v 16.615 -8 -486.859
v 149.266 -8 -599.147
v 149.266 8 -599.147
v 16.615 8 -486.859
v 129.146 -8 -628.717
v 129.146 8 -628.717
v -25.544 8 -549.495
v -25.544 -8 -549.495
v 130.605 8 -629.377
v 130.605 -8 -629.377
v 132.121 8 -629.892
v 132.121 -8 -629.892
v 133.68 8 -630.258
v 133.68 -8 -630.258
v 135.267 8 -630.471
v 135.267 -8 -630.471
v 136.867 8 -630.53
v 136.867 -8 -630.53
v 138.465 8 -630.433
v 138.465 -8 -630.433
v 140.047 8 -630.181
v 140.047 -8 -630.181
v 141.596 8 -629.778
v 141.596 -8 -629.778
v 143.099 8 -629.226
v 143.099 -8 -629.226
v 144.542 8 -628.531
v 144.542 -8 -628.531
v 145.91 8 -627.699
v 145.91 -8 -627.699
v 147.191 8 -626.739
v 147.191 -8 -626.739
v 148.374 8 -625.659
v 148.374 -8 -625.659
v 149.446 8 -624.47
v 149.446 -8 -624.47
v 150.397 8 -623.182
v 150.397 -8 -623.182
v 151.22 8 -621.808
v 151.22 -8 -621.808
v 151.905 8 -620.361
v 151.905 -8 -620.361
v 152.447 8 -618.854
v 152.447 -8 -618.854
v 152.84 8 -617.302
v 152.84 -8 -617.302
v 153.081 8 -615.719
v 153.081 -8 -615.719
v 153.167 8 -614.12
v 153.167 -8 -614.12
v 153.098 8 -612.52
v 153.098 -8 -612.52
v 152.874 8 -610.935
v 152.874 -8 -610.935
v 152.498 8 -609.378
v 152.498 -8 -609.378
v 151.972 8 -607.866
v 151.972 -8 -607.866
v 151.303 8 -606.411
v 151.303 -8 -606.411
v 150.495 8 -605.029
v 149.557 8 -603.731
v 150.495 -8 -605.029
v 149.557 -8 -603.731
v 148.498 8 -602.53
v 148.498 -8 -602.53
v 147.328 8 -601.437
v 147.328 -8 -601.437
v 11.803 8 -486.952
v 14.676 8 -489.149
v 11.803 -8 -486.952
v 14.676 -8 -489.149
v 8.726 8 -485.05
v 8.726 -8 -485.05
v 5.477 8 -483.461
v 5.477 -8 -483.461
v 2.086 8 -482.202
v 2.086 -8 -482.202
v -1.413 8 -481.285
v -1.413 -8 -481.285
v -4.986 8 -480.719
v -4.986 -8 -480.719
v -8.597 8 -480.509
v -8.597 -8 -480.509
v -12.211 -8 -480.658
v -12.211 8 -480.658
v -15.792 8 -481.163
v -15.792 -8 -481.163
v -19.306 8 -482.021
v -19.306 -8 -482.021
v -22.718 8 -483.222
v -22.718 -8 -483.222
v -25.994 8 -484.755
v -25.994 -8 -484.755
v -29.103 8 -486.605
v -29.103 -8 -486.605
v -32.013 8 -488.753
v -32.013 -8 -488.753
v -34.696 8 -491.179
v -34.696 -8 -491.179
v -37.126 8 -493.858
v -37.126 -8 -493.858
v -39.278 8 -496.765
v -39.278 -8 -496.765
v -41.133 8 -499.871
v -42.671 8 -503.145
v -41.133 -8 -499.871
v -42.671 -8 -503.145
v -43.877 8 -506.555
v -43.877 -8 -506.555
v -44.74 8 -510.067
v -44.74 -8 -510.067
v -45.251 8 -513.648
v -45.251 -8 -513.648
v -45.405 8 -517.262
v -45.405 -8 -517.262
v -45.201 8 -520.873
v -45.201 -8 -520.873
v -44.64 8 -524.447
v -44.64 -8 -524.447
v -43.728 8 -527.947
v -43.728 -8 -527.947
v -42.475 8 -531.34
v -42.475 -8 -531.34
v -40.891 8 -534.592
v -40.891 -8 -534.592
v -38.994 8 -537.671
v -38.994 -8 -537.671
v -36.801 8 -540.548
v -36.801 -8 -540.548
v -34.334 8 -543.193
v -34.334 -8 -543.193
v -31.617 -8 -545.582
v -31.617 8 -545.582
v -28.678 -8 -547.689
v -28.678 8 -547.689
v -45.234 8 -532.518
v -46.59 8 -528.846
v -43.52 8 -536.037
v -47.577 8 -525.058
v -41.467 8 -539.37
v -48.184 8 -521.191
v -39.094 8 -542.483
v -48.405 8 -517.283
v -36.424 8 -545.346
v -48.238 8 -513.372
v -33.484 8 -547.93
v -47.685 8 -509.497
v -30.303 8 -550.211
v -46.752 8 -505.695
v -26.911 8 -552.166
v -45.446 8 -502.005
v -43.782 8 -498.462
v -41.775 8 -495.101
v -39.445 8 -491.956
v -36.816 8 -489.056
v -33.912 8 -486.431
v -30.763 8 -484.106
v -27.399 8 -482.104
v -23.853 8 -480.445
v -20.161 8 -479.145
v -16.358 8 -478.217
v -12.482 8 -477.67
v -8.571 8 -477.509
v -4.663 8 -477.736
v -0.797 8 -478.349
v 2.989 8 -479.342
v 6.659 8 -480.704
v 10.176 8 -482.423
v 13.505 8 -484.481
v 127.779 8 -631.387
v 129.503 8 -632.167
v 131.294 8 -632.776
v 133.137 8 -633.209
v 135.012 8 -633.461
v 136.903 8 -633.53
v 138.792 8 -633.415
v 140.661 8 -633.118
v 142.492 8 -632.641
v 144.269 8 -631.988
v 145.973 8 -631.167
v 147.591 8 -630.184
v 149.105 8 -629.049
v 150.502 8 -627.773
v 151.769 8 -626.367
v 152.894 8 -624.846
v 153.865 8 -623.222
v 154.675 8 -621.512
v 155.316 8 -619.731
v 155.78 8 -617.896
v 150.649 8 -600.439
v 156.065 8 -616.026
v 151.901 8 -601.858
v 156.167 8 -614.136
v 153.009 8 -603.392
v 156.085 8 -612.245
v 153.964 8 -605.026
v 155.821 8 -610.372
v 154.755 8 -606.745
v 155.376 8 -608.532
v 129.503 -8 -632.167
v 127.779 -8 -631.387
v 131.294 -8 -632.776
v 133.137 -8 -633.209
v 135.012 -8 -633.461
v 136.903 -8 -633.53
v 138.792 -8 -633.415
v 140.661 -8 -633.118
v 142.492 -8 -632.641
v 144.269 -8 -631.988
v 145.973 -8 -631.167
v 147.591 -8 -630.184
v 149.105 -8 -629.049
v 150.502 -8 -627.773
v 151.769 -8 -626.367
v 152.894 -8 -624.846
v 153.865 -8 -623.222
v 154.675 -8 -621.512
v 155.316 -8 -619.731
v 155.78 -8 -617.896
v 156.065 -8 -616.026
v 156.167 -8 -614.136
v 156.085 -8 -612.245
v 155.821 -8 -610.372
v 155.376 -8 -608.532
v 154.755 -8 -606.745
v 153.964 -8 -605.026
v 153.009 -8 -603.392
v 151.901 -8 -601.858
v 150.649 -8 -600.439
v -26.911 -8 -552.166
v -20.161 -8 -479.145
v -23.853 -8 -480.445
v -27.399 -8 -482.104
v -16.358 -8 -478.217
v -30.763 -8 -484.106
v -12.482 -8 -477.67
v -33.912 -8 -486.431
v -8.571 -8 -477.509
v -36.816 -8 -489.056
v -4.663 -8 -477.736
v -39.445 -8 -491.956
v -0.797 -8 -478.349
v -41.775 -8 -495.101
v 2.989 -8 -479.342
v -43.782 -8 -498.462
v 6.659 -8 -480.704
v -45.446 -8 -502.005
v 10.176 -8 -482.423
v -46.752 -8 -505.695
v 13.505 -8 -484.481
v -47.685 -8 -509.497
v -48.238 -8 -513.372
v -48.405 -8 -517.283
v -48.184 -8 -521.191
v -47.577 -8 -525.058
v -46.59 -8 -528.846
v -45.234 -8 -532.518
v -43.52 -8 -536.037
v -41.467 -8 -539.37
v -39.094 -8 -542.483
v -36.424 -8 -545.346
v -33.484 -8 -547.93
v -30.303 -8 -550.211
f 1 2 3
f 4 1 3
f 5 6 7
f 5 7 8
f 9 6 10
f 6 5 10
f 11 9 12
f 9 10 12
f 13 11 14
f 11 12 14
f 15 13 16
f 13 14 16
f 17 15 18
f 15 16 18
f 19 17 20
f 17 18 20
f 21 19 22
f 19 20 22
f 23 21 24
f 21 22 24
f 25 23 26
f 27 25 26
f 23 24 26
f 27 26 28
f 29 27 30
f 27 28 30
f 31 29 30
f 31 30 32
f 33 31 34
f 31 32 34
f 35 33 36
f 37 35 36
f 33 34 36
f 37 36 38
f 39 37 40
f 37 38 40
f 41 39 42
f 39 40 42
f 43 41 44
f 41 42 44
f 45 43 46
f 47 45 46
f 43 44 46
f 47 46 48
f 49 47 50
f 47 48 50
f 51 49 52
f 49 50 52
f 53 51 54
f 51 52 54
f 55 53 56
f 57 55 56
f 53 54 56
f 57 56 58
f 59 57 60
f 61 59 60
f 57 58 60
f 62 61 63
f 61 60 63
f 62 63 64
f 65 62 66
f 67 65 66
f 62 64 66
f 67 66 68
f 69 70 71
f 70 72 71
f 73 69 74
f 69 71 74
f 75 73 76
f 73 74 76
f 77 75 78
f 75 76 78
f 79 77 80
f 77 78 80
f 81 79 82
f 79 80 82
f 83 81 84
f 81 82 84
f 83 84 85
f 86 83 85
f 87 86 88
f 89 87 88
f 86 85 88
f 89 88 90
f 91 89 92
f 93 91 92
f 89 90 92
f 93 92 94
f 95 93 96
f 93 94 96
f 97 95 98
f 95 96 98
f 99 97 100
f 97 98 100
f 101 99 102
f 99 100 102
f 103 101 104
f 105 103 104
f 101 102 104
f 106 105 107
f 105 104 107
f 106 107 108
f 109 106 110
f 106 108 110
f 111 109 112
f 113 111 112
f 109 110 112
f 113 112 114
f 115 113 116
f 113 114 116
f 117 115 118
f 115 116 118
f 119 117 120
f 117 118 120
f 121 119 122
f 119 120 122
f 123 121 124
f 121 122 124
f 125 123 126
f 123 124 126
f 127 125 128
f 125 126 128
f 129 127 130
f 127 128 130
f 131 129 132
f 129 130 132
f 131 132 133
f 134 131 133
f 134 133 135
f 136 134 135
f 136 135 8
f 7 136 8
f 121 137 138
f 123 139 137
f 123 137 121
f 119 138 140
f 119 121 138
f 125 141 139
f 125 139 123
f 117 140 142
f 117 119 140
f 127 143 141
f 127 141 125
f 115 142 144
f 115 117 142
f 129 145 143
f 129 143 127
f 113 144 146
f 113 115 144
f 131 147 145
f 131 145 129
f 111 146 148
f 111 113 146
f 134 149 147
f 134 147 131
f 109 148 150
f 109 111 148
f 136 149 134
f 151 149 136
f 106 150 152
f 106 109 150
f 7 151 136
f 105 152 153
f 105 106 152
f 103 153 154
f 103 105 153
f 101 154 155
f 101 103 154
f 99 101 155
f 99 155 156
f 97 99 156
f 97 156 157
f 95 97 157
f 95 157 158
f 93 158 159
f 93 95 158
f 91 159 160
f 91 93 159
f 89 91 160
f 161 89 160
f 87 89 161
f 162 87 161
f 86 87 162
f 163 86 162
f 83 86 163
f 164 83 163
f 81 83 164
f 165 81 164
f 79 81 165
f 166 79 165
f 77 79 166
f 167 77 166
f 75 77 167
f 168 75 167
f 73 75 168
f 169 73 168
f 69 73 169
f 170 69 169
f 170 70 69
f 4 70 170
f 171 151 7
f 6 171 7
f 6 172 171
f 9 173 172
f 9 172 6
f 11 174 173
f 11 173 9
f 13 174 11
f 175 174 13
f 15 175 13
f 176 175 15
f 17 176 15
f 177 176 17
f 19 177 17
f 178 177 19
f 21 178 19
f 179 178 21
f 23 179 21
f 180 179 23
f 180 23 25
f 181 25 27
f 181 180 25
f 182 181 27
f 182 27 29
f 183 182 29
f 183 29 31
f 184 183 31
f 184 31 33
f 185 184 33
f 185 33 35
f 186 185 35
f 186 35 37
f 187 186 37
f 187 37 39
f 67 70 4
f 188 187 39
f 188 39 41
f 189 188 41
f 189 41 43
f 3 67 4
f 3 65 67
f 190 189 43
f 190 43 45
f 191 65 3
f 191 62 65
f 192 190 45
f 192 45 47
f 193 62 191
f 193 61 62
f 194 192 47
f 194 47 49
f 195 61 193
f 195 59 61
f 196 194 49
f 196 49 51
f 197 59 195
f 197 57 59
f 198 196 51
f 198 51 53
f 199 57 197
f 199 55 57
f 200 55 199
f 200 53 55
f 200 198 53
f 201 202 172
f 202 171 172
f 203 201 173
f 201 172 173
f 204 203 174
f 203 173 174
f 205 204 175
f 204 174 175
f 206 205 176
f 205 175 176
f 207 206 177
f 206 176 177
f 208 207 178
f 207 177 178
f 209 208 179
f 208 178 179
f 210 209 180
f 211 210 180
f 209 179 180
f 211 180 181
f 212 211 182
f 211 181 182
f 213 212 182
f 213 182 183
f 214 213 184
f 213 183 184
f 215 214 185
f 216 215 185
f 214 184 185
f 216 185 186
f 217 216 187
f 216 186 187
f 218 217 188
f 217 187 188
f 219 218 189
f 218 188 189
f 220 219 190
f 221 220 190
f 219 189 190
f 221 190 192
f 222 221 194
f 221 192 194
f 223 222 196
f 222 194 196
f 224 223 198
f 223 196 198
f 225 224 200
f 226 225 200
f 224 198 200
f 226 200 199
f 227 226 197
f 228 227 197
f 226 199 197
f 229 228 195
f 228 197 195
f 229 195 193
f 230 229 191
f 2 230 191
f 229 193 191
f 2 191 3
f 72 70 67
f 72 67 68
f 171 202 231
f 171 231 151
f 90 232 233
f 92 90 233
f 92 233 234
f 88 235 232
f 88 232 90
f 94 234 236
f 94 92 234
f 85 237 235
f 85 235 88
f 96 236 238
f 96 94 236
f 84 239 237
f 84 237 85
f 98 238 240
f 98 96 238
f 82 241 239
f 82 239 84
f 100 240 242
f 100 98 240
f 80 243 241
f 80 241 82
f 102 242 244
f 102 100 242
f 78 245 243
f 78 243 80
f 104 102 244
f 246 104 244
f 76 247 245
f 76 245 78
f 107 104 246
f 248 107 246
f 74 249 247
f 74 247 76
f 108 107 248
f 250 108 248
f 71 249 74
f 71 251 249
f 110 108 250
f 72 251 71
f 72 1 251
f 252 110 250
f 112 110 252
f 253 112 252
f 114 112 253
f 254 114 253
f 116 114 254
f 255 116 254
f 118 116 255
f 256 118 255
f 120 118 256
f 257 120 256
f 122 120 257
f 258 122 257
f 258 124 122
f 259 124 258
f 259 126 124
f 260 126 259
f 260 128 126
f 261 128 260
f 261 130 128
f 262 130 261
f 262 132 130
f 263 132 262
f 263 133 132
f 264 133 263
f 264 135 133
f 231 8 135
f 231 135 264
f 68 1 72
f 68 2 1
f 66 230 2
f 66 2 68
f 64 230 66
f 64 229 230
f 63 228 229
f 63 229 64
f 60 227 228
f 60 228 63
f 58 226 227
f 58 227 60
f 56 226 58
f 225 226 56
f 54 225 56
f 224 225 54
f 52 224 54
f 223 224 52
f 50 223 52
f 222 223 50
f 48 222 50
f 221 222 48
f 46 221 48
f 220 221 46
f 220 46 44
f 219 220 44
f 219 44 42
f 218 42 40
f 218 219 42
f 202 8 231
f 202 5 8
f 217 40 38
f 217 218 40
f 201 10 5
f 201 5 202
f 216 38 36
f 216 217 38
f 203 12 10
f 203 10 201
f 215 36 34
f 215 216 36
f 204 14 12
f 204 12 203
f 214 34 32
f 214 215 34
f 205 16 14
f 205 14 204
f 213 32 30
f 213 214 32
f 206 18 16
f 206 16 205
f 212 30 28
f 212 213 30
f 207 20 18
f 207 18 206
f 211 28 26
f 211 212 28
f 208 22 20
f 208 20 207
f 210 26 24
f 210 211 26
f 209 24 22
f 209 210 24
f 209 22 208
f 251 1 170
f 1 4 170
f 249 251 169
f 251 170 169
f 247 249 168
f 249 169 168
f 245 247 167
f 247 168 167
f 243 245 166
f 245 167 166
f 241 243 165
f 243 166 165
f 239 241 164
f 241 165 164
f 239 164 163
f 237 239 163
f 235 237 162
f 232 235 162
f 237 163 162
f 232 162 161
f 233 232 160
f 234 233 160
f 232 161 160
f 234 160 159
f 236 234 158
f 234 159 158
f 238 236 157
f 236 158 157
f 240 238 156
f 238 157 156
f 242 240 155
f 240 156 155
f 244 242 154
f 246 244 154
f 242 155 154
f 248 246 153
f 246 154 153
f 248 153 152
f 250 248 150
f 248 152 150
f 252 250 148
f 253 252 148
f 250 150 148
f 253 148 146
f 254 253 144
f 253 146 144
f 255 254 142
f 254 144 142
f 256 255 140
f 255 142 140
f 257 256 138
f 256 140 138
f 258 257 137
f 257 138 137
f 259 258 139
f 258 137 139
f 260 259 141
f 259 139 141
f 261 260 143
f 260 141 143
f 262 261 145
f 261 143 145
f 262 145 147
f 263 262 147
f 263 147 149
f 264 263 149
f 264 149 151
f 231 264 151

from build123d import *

# Parameters (mm, degrees)
SKETCH2_W = 3
SKETCH2_H = 16


with BuildPart() as part:
    # Sweep1: sweep along a path in Sketch1
    with BuildLine(Plane(origin=(0, 0, 0), x_dir=(1, 0, 0), z_dir=(0, 1, 0))) as sweep1_path:
        Line((-26.227685645, 550.830501906), (128.462333695, 630.052155615))
        ThreePointArc((128.462333695, 630.052155615), (151.645431275, 624.013717264), (148.296942376, 600.292284483))
        Line((148.296942376, 600.292284483), (15.645377126, 488.004107292))
        ThreePointArc((15.645377126, 488.004107292), (-40.52661613, 495.933278247), (-26.227685645, 550.830501906))
    # Sketch2 → Sweep1 (sweep)
    with BuildSketch(Plane(origin=(15.645377126, 0, -488.004107292), x_dir=(0.6460915939046579, 0, 0.7632598851542892), z_dir=(-0.7632598851542891, 0, 0.6460915939046578))):
        Rectangle(SKETCH2_W, SKETCH2_H)
    sweep(path=sweep1_path.line)


solid = part.part
